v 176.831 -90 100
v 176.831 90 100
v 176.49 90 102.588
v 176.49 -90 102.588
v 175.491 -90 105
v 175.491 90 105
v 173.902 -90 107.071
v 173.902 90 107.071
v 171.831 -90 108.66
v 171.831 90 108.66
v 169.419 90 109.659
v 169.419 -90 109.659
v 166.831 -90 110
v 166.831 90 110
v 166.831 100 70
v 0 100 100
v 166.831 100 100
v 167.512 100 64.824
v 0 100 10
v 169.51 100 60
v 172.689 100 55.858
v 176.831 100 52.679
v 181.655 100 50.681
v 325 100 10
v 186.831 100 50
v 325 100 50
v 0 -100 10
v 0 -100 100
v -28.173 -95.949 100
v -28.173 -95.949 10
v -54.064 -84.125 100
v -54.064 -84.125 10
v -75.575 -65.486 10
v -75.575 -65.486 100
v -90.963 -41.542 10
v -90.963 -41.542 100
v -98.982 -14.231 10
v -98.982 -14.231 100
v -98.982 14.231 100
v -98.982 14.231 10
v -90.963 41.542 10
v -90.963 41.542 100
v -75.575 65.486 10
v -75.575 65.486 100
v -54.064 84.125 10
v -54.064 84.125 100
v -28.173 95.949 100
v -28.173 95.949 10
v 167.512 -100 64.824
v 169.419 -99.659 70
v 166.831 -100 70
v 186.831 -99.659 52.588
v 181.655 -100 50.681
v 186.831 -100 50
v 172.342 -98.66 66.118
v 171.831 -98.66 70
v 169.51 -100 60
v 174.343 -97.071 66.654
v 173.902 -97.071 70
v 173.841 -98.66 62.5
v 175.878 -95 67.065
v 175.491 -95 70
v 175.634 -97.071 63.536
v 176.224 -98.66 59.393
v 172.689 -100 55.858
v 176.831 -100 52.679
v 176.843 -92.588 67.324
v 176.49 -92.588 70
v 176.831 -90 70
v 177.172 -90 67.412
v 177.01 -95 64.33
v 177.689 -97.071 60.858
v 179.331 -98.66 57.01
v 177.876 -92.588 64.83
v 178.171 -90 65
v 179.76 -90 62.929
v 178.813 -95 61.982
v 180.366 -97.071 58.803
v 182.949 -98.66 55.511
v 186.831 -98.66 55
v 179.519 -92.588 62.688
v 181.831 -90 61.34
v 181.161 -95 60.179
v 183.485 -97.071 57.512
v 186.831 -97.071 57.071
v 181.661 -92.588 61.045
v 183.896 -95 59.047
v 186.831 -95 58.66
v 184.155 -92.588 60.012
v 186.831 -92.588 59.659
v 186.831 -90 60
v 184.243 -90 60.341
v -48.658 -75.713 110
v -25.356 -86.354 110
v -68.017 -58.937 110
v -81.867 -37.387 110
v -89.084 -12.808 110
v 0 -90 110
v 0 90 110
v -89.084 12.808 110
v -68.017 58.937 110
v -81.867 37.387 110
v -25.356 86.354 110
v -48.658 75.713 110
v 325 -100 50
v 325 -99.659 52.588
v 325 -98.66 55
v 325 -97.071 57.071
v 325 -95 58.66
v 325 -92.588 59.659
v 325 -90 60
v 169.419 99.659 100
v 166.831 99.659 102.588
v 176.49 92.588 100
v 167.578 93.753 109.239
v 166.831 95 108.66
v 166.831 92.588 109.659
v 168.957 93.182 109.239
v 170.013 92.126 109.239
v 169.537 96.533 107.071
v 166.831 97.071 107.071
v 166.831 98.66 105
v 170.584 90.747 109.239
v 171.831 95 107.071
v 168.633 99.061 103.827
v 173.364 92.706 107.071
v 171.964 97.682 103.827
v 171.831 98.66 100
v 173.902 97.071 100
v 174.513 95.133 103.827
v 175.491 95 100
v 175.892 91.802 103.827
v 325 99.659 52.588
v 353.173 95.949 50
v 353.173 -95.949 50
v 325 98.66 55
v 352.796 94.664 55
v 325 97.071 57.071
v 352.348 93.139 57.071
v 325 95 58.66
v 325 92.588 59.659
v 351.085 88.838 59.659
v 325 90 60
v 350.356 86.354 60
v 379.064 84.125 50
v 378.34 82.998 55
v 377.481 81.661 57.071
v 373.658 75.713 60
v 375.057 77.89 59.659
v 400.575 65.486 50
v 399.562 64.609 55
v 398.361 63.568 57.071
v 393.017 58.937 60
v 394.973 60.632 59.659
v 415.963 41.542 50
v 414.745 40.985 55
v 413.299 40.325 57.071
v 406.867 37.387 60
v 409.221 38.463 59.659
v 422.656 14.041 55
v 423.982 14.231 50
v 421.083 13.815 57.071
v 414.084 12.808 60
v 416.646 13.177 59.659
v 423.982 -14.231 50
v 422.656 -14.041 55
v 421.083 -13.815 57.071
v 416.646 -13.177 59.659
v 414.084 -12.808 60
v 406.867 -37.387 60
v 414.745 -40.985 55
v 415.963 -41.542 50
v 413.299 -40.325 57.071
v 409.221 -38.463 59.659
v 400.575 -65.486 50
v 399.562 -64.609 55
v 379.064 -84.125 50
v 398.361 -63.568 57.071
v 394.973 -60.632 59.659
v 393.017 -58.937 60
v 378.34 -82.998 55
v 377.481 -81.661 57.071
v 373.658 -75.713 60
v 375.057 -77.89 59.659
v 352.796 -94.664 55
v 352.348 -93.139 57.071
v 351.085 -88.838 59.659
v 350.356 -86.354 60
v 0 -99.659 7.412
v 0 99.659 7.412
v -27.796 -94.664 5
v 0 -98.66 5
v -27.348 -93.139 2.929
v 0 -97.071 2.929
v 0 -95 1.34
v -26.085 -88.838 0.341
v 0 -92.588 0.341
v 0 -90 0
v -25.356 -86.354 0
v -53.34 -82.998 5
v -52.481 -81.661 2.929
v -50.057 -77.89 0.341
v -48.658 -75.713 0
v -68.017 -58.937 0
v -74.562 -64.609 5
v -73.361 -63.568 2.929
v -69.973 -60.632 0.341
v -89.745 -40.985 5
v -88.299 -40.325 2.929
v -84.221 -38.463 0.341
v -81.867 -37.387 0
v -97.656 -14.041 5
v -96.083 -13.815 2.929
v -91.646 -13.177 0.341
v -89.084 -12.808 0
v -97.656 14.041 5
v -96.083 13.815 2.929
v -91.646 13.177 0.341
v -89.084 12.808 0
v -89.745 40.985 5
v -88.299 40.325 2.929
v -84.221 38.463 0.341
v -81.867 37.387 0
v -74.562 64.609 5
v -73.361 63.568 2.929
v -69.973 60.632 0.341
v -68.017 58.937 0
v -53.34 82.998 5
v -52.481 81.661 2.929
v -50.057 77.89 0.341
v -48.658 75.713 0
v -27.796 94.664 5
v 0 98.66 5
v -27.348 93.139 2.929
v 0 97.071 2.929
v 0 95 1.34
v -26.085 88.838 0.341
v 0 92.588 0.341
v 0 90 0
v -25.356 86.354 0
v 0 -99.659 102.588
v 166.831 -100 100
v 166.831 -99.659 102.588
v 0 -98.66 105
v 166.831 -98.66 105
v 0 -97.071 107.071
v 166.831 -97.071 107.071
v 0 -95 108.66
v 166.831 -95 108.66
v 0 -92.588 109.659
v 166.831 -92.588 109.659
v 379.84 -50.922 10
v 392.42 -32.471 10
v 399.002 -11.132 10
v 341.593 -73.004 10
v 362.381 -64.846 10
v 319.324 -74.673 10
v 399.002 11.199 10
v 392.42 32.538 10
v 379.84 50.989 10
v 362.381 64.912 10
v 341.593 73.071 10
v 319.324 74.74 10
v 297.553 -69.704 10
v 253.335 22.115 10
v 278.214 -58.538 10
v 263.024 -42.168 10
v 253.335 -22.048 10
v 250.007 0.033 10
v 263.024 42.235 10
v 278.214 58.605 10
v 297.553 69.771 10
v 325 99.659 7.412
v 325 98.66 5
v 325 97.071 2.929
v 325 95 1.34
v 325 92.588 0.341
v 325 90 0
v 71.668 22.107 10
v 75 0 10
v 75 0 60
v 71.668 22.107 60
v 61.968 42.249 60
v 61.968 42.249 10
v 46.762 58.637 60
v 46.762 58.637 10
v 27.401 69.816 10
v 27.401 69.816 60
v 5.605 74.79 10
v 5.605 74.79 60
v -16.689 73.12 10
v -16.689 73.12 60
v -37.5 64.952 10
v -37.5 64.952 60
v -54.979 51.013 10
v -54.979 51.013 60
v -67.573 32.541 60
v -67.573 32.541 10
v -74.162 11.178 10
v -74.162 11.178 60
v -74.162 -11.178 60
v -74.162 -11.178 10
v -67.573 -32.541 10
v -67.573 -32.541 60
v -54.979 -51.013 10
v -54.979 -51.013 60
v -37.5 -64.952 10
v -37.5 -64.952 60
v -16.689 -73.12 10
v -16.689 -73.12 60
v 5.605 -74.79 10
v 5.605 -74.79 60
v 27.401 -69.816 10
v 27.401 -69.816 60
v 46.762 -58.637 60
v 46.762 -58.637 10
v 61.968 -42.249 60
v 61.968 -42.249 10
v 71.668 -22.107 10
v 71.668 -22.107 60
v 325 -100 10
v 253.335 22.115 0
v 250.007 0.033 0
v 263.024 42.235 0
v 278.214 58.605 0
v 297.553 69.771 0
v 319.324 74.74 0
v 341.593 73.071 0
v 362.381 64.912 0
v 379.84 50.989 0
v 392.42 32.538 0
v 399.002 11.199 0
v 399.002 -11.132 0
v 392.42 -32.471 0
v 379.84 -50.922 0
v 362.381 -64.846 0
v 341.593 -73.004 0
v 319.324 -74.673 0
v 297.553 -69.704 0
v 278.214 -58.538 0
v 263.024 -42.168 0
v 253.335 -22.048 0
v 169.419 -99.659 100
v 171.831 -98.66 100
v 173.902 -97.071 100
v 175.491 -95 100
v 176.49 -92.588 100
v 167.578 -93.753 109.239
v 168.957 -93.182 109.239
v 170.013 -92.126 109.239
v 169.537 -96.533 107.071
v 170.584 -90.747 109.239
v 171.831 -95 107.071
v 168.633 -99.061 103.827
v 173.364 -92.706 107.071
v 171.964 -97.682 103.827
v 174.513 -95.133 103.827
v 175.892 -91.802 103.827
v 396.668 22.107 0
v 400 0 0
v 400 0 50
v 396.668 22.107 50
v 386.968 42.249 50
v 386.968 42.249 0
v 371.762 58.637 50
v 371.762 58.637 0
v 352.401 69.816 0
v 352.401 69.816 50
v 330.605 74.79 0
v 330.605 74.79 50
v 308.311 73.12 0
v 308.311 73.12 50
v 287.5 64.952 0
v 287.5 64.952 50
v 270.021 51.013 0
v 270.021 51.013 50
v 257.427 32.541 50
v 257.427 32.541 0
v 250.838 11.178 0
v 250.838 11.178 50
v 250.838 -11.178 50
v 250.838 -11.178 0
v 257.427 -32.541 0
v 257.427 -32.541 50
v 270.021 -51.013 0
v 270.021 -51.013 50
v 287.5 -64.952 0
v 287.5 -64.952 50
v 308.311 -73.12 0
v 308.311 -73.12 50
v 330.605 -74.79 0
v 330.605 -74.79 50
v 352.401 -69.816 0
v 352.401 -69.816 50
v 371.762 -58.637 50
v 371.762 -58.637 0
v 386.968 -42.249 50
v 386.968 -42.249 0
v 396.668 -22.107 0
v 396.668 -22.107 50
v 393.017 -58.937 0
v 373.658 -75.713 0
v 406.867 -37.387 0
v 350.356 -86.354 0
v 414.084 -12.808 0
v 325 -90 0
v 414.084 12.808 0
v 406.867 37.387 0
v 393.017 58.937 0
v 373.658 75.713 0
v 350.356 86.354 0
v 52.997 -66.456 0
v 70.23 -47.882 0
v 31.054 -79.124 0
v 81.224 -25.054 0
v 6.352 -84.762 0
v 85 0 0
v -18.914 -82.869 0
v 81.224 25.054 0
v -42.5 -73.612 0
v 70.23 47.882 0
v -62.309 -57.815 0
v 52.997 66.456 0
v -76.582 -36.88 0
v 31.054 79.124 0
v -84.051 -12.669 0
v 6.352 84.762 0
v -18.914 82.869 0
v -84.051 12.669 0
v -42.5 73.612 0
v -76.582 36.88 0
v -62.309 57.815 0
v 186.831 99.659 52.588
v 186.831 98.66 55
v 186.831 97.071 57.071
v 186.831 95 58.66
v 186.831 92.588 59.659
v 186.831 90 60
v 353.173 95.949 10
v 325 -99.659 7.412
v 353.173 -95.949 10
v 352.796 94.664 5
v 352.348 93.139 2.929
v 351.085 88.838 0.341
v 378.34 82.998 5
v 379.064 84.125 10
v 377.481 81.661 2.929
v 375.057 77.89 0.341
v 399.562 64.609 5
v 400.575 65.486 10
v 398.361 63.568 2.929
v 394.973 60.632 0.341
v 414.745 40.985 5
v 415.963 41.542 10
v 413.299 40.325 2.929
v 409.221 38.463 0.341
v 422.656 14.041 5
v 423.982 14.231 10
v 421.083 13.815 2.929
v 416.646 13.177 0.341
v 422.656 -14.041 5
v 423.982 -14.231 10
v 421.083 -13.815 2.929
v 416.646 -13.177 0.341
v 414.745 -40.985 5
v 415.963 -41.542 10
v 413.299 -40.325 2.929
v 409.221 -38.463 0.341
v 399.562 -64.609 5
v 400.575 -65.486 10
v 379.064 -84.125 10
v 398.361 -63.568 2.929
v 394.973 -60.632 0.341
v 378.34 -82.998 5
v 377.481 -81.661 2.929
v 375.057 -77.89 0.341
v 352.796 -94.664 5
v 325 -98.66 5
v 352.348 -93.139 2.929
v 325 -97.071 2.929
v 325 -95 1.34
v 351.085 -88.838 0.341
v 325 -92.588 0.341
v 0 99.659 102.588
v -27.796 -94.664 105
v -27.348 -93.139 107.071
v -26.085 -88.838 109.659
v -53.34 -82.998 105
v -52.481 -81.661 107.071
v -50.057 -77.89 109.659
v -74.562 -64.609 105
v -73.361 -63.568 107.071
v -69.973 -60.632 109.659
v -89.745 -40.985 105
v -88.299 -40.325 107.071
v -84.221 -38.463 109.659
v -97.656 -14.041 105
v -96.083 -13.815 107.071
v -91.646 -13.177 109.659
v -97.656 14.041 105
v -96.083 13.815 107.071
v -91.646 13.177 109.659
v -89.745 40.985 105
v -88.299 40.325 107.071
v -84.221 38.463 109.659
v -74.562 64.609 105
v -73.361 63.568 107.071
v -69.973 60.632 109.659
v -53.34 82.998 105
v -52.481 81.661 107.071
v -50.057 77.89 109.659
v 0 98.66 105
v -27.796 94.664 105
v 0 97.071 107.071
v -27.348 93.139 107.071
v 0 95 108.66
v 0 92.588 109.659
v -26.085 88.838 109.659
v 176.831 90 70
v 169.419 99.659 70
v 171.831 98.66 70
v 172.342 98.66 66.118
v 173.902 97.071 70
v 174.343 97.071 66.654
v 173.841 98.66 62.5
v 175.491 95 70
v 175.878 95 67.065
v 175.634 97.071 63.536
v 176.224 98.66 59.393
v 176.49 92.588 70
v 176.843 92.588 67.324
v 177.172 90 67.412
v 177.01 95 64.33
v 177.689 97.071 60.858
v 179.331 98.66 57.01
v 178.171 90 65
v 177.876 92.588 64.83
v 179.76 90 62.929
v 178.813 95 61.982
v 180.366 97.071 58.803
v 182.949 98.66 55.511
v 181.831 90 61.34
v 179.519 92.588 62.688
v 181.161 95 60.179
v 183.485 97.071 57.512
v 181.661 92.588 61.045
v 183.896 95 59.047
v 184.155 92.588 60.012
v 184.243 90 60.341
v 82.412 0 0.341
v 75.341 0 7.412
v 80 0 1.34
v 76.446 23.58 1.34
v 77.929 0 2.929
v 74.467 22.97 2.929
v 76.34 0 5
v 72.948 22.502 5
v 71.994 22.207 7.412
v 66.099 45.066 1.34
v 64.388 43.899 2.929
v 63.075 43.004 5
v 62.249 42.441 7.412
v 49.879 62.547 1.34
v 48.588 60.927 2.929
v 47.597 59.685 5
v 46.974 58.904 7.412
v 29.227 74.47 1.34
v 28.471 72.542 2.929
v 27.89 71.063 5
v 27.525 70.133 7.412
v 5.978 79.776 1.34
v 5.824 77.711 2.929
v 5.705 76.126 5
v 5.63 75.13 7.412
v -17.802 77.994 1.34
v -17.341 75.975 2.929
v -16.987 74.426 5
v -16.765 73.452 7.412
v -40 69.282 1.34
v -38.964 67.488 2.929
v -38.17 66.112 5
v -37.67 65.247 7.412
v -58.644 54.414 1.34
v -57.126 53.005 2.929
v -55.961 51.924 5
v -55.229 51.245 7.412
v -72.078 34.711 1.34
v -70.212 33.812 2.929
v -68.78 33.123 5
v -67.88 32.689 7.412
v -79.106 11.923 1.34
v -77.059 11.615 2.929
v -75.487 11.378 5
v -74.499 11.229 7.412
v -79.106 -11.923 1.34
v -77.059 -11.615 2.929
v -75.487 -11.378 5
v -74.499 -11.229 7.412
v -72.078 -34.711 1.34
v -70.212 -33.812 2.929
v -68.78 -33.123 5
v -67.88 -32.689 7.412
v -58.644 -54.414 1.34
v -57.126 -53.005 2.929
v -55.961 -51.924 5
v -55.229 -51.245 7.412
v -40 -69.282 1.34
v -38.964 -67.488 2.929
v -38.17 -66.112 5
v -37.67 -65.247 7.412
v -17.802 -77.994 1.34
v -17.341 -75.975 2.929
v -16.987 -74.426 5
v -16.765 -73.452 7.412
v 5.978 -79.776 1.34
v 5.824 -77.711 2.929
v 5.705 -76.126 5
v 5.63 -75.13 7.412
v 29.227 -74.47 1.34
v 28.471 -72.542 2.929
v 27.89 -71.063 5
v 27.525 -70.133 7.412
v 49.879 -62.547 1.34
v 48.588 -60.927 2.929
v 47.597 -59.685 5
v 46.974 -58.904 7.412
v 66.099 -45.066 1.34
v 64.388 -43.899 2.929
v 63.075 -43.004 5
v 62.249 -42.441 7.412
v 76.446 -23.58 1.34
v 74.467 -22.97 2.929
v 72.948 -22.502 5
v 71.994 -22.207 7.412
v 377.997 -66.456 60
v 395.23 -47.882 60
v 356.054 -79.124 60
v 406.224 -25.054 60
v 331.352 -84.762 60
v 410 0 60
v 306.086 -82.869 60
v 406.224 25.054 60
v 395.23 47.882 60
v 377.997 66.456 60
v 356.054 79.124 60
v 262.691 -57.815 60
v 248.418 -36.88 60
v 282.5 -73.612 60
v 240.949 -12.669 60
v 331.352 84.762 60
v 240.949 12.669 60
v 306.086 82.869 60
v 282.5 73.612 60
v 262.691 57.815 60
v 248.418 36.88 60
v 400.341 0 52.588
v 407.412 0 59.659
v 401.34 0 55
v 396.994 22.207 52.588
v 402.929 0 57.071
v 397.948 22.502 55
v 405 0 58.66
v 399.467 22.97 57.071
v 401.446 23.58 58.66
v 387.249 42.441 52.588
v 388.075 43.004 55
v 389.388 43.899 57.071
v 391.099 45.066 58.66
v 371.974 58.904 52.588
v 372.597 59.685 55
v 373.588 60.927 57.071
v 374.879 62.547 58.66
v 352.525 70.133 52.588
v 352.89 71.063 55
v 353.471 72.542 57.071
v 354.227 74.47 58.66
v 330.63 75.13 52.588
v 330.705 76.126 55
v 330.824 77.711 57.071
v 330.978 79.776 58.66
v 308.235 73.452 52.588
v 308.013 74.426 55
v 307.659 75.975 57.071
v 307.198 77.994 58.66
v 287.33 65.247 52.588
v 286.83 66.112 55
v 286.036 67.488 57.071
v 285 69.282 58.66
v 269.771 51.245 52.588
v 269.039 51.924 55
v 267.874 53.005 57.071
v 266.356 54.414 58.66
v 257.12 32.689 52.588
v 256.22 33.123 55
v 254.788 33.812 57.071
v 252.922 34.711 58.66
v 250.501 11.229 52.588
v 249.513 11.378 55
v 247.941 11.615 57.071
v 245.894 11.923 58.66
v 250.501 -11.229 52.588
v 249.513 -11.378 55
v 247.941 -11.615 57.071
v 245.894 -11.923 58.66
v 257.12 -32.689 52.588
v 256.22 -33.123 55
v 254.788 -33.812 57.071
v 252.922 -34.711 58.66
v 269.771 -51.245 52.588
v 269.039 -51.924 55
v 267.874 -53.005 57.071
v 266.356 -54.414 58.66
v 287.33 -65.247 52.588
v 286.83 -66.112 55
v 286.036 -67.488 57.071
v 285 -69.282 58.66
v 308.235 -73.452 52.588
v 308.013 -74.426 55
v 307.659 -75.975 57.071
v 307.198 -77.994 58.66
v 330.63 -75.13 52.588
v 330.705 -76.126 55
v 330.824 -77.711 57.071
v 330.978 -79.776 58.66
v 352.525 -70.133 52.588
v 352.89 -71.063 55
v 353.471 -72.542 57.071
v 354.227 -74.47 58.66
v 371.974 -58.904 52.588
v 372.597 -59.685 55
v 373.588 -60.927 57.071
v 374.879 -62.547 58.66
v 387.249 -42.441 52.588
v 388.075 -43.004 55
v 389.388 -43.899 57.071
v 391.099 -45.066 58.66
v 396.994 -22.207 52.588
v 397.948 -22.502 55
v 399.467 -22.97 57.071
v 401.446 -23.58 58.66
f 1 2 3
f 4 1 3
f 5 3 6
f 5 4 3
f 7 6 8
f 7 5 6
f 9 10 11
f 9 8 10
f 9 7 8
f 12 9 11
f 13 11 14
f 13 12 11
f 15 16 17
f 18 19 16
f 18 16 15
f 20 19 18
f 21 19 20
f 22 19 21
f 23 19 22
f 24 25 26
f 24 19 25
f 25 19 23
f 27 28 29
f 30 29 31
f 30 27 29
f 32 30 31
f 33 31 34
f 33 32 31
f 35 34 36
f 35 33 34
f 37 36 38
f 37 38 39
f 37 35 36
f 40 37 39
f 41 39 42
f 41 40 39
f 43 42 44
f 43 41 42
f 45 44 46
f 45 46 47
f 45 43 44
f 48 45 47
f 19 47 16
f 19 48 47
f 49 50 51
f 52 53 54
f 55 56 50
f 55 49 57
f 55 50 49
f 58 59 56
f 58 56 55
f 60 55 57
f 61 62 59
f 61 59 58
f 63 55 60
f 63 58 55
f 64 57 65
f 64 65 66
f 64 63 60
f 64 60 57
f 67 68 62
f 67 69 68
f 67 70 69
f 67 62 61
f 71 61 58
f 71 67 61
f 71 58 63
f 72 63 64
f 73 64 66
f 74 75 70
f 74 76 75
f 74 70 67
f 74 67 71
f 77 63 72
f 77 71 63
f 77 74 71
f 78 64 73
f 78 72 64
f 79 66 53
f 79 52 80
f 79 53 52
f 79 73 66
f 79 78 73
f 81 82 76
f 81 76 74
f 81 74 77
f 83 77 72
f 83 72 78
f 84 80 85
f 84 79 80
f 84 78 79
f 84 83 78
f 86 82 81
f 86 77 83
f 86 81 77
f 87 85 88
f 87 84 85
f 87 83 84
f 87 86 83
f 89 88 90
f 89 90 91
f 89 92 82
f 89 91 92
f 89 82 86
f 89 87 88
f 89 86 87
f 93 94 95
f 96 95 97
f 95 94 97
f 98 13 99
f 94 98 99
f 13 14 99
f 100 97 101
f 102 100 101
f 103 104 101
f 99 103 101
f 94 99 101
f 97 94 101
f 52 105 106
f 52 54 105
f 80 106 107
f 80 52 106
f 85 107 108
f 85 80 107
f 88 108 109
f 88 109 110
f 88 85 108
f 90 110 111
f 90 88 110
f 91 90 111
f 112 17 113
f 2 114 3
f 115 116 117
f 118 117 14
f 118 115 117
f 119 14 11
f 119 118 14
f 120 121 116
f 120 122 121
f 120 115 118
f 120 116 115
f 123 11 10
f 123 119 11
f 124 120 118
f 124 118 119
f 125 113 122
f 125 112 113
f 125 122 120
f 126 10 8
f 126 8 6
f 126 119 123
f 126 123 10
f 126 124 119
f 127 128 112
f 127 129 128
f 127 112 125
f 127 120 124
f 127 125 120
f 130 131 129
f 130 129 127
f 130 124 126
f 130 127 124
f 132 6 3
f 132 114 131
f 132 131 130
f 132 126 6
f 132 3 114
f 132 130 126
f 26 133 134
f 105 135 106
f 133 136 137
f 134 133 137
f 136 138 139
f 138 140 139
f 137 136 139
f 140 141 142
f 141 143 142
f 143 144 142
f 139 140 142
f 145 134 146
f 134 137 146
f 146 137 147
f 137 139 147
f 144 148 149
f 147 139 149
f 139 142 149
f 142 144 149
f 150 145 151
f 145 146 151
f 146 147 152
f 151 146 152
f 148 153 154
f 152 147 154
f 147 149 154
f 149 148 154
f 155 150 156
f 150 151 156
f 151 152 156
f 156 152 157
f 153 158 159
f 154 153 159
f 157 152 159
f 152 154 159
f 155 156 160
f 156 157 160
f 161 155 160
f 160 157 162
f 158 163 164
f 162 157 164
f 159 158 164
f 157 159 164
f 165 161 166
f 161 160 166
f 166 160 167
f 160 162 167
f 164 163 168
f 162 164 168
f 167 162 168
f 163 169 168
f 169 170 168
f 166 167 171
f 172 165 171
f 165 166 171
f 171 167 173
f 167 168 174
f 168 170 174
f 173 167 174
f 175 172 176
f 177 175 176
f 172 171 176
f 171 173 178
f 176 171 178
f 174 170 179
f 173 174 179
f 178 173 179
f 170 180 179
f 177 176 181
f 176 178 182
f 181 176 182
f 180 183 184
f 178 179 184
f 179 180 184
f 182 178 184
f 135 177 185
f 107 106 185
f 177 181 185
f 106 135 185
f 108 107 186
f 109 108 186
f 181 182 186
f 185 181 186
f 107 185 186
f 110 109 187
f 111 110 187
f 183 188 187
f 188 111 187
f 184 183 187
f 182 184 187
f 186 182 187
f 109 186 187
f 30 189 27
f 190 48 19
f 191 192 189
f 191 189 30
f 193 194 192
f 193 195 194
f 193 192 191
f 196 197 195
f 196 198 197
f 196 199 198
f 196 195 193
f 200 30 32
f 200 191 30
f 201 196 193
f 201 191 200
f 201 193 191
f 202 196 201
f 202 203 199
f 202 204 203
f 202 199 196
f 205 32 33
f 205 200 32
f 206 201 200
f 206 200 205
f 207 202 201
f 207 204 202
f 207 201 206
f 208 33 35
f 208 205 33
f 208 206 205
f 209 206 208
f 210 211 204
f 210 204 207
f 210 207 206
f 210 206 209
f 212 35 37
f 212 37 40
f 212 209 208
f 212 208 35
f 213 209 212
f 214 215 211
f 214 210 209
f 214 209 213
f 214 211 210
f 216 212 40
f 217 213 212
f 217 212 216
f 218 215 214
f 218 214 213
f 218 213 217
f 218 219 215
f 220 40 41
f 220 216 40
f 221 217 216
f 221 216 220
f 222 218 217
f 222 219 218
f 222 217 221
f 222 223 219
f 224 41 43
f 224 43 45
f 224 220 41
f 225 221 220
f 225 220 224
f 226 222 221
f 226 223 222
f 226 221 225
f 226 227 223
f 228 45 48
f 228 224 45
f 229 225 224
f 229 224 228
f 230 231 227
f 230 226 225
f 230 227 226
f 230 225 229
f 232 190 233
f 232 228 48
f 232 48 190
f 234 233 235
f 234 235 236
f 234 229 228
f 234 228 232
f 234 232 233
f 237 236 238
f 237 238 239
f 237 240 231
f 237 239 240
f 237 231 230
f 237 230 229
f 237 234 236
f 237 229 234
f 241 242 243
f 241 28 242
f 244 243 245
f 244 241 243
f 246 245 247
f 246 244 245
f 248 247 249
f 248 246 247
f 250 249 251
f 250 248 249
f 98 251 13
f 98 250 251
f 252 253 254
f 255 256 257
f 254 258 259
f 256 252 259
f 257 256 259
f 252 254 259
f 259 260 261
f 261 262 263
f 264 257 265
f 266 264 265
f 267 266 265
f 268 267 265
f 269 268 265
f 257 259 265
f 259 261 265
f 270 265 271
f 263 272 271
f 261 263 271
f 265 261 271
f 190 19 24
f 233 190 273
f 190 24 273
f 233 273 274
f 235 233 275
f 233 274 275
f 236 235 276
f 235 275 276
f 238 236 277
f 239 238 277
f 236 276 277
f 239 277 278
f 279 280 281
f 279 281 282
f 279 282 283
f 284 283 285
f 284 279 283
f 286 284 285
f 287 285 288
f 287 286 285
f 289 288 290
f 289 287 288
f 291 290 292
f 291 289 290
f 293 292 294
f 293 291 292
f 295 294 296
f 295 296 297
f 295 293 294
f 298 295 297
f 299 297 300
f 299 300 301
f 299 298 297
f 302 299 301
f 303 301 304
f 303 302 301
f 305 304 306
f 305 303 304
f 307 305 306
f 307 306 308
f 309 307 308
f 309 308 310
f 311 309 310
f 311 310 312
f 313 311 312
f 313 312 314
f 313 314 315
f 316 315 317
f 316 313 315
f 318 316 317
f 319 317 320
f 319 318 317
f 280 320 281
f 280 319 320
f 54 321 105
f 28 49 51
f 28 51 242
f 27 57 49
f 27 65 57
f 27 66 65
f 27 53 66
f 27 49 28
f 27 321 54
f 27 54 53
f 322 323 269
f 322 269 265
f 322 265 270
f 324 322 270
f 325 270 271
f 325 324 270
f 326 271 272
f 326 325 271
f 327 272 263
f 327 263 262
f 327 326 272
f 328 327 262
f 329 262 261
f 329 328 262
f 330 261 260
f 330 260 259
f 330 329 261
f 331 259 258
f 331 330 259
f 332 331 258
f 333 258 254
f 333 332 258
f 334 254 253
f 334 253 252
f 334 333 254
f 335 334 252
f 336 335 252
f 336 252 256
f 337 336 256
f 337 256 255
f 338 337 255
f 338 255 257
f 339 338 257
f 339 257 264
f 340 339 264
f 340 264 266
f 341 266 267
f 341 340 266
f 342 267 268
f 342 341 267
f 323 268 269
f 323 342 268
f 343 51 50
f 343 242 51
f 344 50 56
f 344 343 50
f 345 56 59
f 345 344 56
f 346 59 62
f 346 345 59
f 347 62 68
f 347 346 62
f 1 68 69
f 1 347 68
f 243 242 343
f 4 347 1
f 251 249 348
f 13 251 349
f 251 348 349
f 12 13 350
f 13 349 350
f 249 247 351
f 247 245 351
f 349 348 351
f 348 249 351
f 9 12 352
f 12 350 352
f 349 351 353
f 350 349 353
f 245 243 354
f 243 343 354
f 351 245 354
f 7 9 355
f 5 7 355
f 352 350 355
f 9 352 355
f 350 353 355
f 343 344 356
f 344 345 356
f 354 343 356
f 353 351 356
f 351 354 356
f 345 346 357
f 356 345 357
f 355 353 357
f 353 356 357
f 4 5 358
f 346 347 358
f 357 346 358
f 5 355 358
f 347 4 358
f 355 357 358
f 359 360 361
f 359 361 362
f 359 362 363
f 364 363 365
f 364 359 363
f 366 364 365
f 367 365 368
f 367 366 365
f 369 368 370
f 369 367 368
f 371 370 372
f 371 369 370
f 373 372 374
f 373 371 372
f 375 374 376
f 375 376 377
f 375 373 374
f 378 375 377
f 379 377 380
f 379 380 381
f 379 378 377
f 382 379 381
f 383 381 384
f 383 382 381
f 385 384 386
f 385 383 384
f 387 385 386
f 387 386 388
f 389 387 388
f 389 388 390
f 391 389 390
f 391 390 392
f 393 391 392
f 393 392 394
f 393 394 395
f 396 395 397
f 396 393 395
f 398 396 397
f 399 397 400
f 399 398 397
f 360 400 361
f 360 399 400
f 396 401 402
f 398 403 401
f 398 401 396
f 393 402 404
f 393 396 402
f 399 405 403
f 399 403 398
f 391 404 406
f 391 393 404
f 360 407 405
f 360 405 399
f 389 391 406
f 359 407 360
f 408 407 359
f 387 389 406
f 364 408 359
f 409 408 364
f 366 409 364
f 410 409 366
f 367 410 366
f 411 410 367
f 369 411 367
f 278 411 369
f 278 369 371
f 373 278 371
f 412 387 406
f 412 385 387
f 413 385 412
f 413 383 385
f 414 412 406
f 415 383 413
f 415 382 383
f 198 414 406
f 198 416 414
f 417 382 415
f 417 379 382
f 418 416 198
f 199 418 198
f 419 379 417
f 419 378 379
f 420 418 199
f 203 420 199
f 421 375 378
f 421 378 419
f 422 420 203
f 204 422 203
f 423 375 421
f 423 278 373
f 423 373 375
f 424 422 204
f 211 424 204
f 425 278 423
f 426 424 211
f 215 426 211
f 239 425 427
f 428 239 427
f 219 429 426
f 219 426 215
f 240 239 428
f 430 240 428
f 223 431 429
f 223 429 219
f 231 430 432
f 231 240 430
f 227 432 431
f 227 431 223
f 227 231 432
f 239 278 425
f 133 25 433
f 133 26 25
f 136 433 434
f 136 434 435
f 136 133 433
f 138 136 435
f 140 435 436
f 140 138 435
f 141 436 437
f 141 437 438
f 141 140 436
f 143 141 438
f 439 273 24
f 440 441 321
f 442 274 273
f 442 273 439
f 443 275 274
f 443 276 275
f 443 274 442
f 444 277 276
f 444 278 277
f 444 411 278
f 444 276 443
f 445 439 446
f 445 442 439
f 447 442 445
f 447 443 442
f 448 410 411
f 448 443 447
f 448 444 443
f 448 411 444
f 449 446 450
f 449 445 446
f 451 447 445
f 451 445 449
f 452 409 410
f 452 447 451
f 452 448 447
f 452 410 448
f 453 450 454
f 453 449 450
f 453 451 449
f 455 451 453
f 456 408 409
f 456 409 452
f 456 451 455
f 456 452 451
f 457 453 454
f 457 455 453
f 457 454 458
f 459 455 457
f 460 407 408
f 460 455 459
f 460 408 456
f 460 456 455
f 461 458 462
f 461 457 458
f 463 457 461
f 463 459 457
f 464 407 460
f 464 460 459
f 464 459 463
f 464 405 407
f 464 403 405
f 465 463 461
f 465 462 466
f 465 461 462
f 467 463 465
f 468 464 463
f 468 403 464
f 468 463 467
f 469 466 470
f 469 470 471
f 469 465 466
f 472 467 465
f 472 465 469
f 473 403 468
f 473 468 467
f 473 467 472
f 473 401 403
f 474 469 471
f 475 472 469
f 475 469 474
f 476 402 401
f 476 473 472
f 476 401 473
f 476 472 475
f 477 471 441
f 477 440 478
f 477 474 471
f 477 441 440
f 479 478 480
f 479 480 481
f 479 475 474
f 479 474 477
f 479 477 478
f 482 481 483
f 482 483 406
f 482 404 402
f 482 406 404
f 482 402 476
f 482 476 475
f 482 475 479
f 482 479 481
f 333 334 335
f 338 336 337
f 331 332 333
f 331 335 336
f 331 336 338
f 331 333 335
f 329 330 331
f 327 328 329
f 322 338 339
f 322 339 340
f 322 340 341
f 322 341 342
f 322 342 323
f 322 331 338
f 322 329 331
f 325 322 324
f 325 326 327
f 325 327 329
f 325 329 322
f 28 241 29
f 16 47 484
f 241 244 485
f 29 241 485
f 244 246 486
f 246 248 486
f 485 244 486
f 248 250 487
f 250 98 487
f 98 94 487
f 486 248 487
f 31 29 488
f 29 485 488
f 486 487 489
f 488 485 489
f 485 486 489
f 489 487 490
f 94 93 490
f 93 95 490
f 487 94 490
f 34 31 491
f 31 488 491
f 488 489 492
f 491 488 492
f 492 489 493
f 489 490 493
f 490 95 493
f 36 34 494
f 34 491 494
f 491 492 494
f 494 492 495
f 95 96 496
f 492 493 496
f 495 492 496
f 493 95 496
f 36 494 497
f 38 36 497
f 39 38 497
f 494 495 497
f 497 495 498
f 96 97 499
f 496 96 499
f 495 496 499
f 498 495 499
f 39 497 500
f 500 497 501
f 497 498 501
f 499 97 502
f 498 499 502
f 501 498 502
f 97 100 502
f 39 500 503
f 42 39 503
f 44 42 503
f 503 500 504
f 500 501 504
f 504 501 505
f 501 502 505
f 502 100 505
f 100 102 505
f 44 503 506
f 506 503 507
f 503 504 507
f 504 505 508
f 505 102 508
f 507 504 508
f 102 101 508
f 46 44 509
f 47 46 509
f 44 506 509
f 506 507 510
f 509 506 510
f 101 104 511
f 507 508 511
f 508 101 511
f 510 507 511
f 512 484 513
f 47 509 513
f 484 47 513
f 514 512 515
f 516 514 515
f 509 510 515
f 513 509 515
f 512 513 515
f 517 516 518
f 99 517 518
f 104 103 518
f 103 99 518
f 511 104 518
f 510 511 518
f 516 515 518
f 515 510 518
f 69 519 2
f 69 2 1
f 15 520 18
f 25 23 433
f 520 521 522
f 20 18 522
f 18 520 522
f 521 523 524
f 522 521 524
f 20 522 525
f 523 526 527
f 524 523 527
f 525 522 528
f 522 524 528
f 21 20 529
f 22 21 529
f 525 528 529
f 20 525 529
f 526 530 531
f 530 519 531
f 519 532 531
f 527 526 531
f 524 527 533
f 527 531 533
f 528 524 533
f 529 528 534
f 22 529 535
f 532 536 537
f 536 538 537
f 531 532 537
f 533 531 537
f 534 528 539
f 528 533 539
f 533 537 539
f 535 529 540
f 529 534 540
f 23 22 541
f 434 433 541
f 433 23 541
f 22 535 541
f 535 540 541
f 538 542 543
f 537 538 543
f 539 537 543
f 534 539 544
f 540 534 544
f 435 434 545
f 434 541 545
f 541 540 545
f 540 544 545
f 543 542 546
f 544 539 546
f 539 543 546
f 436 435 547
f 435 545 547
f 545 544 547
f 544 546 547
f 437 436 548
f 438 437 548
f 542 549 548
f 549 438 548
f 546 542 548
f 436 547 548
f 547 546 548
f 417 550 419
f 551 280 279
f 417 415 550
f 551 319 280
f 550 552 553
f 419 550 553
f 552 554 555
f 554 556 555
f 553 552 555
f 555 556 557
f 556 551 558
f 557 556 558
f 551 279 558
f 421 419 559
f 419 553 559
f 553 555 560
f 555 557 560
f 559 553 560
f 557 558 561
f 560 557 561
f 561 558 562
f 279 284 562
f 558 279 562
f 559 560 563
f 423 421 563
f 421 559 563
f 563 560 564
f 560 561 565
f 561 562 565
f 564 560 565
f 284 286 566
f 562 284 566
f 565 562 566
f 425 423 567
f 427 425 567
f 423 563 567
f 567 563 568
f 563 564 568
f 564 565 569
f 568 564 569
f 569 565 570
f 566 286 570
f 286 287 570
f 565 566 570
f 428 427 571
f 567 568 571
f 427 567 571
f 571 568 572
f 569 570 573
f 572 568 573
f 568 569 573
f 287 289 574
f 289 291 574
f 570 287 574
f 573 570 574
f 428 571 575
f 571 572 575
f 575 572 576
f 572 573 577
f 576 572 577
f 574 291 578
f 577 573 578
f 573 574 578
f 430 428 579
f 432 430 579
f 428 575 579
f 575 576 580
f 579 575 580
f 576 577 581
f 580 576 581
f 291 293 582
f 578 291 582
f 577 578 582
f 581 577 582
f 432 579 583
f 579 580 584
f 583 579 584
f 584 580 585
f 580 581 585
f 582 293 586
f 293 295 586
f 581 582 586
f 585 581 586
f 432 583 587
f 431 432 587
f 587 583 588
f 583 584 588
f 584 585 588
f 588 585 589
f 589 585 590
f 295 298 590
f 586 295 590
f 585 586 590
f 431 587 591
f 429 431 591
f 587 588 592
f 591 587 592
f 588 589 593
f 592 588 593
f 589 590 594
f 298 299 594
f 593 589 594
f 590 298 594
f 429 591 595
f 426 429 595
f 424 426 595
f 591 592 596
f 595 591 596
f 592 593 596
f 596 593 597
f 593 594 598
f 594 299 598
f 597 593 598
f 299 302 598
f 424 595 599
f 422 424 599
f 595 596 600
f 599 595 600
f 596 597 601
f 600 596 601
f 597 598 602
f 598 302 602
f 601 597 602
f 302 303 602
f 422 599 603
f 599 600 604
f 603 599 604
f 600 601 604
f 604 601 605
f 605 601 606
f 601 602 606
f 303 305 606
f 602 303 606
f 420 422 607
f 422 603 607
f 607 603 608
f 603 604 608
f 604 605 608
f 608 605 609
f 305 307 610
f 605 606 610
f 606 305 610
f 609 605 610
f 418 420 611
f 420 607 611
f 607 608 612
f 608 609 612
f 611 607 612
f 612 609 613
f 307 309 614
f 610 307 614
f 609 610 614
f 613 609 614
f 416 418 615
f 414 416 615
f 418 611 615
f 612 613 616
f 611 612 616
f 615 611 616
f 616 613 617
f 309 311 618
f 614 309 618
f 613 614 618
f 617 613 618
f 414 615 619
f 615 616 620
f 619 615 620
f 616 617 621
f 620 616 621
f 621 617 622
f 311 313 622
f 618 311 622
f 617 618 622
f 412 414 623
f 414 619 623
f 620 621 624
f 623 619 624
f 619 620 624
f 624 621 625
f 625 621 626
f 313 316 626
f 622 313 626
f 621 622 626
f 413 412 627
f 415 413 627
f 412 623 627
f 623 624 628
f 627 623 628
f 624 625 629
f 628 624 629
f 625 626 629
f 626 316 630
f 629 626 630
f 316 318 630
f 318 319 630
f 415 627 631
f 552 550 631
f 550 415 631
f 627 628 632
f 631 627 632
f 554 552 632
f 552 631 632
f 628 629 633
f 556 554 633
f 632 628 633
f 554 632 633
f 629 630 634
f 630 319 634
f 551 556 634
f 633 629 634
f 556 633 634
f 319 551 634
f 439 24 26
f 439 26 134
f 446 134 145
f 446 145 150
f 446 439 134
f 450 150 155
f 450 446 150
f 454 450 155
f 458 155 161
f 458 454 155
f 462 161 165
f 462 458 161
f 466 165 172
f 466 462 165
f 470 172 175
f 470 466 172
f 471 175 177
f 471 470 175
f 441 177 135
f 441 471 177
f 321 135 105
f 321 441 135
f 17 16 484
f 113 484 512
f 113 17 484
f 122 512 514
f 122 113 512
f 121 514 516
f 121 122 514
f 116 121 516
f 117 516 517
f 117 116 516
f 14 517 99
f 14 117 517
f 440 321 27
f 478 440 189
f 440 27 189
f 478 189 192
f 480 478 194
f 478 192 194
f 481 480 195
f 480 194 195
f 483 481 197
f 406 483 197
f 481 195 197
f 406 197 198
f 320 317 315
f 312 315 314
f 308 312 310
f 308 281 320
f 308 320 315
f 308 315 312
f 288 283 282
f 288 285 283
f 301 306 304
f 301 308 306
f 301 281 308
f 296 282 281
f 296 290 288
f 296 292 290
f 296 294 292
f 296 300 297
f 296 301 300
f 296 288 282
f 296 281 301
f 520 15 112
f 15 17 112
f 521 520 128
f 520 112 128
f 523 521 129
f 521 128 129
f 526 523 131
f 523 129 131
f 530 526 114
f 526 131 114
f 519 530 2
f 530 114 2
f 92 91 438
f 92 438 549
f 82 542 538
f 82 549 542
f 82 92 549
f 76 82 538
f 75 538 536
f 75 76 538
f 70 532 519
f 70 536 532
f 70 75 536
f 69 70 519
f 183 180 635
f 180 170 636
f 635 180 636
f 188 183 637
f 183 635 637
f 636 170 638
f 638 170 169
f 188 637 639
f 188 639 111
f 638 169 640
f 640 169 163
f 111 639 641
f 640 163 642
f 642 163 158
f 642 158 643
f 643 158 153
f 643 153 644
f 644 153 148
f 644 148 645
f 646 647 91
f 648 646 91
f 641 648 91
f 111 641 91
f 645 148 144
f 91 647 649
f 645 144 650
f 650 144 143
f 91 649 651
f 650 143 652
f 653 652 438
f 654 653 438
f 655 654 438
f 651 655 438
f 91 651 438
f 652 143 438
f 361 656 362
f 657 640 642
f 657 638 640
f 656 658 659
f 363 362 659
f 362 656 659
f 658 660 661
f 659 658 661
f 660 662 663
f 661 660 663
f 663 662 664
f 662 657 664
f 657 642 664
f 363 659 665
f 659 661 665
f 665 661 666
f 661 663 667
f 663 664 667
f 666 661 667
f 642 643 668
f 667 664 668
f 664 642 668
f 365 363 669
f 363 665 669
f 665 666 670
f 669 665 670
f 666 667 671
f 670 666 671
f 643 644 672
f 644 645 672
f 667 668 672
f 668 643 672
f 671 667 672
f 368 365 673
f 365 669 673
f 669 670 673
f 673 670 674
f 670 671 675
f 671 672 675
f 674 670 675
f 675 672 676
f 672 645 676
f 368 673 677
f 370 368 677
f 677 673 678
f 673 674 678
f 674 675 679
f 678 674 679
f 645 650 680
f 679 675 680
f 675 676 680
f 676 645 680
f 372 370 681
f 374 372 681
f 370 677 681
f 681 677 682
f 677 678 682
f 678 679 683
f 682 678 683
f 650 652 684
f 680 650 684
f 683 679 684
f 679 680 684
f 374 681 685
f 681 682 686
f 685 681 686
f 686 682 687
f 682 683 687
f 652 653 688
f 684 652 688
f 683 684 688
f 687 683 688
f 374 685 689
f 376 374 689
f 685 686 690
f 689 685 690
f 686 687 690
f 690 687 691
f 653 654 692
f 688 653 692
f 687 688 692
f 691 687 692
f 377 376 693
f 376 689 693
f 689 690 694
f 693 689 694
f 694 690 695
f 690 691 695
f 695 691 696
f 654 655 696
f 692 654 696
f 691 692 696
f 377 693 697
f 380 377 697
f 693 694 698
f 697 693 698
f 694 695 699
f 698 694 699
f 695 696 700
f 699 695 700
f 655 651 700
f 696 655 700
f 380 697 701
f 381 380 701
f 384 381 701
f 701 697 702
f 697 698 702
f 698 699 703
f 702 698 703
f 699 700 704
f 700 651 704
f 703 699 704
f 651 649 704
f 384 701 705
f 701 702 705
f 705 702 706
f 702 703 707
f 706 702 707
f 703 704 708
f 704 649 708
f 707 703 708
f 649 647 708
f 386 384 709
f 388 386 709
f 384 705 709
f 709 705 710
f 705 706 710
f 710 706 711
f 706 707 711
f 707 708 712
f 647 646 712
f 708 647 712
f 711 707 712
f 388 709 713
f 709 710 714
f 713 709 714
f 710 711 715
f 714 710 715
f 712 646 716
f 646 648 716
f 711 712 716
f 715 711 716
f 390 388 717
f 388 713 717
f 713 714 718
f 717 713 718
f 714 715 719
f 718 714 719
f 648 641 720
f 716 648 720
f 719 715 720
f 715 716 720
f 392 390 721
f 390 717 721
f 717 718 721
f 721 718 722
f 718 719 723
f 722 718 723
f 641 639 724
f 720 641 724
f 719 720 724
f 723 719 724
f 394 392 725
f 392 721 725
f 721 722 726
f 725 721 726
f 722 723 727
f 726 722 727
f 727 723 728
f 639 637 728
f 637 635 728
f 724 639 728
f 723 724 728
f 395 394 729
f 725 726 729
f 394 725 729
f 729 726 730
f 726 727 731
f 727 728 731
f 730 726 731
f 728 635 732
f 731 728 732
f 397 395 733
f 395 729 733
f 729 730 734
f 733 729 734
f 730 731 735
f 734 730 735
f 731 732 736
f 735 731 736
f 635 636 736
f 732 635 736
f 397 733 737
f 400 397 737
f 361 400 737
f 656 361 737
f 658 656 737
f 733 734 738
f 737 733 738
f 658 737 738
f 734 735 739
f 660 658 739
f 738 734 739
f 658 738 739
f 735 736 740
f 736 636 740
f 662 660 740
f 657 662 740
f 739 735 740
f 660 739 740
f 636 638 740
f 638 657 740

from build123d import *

# Parameters (mm, degrees)
SKIZZE1_R                       = 75
AUFSATZ_LINEAR_AUSTRAGEN1_DEPTH = 60
AUFSATZ_LINEAR_AUSTRAGEN2_DEPTH = 50
SKIZZE4_R                       = 74.91592882
AUFSATZ_LINEAR_AUSTRAGEN3_DEPTH = 10
VERRUNDUNG7_R                   = 10


with BuildPart() as part:
    # Skizze1 → Aufsatz-Linear austragen1 (new body)
    with BuildSketch(Plane.XY):
        with BuildLine():
            Line((0, 100), (325, 100))
            ThreePointArc((325, 100), (425, 0), (325, -100))
            Line((325, -100), (0, -100))
            ThreePointArc((0, -100), (-100, 0), (0, 100))
        make_face()
        Circle(SKIZZE1_R, mode=Mode.SUBTRACT)
        with Locations((325, 0)):
            Circle(SKIZZE1_R, mode=Mode.SUBTRACT)
    extrude(amount=AUFSATZ_LINEAR_AUSTRAGEN1_DEPTH)

    # Skizze2 → Aufsatz-Linear austragen2 (add)
    with BuildSketch(Plane.XY.offset(60)):
        with BuildLine():
            Line((0, 100), (176.830965538, 100))
            Line((176.830965538, 100), (176.830965538, -100))
            Line((176.830965538, -100), (0, -100))
            ThreePointArc((0, -100), (-100, 0), (0, 100))
        make_face()
    extrude(amount=AUFSATZ_LINEAR_AUSTRAGEN2_DEPTH)

    # Verrundung7
    verrundung7_edges = [part.edges().sort_by_distance(p)[0] for p in [
        (-75, 0, 0),
        (250, 0, 60),
        (250.915482769, -100, 60),
        (176.830965538, 0, 60),
        (176.830965538, -100, 85),
        (176.830965538, 100, 85),
        (-100, 0, 110),
        (88.415482769, -100, 110),
        (176.830965538, 0, 110),
        (88.415482769, 100, 110),
        (425, 0, 60),
        (162.5, -100, 0),
        (-100, 0, 0),
        (162.5, 100, 0),
        (425, 0, 0),
        (250.915482769, 100, 60),
    ]]
    fillet(verrundung7_edges, radius=VERRUNDUNG7_R)


with BuildPart() as body_2:
    # Skizze4 → Aufsatz-Linear austragen3 (new body)
    with BuildSketch(Plane(origin=(0, 0, 0), x_dir=(-1, 0, 0), z_dir=(0, 0, -1))):
        with Locations((-324.922829987, 0.033357945)):
            Circle(SKIZZE4_R)
    extrude(amount=-AUFSATZ_LINEAR_AUSTRAGEN3_DEPTH)


solid = Compound([part.part, body_2.part])
